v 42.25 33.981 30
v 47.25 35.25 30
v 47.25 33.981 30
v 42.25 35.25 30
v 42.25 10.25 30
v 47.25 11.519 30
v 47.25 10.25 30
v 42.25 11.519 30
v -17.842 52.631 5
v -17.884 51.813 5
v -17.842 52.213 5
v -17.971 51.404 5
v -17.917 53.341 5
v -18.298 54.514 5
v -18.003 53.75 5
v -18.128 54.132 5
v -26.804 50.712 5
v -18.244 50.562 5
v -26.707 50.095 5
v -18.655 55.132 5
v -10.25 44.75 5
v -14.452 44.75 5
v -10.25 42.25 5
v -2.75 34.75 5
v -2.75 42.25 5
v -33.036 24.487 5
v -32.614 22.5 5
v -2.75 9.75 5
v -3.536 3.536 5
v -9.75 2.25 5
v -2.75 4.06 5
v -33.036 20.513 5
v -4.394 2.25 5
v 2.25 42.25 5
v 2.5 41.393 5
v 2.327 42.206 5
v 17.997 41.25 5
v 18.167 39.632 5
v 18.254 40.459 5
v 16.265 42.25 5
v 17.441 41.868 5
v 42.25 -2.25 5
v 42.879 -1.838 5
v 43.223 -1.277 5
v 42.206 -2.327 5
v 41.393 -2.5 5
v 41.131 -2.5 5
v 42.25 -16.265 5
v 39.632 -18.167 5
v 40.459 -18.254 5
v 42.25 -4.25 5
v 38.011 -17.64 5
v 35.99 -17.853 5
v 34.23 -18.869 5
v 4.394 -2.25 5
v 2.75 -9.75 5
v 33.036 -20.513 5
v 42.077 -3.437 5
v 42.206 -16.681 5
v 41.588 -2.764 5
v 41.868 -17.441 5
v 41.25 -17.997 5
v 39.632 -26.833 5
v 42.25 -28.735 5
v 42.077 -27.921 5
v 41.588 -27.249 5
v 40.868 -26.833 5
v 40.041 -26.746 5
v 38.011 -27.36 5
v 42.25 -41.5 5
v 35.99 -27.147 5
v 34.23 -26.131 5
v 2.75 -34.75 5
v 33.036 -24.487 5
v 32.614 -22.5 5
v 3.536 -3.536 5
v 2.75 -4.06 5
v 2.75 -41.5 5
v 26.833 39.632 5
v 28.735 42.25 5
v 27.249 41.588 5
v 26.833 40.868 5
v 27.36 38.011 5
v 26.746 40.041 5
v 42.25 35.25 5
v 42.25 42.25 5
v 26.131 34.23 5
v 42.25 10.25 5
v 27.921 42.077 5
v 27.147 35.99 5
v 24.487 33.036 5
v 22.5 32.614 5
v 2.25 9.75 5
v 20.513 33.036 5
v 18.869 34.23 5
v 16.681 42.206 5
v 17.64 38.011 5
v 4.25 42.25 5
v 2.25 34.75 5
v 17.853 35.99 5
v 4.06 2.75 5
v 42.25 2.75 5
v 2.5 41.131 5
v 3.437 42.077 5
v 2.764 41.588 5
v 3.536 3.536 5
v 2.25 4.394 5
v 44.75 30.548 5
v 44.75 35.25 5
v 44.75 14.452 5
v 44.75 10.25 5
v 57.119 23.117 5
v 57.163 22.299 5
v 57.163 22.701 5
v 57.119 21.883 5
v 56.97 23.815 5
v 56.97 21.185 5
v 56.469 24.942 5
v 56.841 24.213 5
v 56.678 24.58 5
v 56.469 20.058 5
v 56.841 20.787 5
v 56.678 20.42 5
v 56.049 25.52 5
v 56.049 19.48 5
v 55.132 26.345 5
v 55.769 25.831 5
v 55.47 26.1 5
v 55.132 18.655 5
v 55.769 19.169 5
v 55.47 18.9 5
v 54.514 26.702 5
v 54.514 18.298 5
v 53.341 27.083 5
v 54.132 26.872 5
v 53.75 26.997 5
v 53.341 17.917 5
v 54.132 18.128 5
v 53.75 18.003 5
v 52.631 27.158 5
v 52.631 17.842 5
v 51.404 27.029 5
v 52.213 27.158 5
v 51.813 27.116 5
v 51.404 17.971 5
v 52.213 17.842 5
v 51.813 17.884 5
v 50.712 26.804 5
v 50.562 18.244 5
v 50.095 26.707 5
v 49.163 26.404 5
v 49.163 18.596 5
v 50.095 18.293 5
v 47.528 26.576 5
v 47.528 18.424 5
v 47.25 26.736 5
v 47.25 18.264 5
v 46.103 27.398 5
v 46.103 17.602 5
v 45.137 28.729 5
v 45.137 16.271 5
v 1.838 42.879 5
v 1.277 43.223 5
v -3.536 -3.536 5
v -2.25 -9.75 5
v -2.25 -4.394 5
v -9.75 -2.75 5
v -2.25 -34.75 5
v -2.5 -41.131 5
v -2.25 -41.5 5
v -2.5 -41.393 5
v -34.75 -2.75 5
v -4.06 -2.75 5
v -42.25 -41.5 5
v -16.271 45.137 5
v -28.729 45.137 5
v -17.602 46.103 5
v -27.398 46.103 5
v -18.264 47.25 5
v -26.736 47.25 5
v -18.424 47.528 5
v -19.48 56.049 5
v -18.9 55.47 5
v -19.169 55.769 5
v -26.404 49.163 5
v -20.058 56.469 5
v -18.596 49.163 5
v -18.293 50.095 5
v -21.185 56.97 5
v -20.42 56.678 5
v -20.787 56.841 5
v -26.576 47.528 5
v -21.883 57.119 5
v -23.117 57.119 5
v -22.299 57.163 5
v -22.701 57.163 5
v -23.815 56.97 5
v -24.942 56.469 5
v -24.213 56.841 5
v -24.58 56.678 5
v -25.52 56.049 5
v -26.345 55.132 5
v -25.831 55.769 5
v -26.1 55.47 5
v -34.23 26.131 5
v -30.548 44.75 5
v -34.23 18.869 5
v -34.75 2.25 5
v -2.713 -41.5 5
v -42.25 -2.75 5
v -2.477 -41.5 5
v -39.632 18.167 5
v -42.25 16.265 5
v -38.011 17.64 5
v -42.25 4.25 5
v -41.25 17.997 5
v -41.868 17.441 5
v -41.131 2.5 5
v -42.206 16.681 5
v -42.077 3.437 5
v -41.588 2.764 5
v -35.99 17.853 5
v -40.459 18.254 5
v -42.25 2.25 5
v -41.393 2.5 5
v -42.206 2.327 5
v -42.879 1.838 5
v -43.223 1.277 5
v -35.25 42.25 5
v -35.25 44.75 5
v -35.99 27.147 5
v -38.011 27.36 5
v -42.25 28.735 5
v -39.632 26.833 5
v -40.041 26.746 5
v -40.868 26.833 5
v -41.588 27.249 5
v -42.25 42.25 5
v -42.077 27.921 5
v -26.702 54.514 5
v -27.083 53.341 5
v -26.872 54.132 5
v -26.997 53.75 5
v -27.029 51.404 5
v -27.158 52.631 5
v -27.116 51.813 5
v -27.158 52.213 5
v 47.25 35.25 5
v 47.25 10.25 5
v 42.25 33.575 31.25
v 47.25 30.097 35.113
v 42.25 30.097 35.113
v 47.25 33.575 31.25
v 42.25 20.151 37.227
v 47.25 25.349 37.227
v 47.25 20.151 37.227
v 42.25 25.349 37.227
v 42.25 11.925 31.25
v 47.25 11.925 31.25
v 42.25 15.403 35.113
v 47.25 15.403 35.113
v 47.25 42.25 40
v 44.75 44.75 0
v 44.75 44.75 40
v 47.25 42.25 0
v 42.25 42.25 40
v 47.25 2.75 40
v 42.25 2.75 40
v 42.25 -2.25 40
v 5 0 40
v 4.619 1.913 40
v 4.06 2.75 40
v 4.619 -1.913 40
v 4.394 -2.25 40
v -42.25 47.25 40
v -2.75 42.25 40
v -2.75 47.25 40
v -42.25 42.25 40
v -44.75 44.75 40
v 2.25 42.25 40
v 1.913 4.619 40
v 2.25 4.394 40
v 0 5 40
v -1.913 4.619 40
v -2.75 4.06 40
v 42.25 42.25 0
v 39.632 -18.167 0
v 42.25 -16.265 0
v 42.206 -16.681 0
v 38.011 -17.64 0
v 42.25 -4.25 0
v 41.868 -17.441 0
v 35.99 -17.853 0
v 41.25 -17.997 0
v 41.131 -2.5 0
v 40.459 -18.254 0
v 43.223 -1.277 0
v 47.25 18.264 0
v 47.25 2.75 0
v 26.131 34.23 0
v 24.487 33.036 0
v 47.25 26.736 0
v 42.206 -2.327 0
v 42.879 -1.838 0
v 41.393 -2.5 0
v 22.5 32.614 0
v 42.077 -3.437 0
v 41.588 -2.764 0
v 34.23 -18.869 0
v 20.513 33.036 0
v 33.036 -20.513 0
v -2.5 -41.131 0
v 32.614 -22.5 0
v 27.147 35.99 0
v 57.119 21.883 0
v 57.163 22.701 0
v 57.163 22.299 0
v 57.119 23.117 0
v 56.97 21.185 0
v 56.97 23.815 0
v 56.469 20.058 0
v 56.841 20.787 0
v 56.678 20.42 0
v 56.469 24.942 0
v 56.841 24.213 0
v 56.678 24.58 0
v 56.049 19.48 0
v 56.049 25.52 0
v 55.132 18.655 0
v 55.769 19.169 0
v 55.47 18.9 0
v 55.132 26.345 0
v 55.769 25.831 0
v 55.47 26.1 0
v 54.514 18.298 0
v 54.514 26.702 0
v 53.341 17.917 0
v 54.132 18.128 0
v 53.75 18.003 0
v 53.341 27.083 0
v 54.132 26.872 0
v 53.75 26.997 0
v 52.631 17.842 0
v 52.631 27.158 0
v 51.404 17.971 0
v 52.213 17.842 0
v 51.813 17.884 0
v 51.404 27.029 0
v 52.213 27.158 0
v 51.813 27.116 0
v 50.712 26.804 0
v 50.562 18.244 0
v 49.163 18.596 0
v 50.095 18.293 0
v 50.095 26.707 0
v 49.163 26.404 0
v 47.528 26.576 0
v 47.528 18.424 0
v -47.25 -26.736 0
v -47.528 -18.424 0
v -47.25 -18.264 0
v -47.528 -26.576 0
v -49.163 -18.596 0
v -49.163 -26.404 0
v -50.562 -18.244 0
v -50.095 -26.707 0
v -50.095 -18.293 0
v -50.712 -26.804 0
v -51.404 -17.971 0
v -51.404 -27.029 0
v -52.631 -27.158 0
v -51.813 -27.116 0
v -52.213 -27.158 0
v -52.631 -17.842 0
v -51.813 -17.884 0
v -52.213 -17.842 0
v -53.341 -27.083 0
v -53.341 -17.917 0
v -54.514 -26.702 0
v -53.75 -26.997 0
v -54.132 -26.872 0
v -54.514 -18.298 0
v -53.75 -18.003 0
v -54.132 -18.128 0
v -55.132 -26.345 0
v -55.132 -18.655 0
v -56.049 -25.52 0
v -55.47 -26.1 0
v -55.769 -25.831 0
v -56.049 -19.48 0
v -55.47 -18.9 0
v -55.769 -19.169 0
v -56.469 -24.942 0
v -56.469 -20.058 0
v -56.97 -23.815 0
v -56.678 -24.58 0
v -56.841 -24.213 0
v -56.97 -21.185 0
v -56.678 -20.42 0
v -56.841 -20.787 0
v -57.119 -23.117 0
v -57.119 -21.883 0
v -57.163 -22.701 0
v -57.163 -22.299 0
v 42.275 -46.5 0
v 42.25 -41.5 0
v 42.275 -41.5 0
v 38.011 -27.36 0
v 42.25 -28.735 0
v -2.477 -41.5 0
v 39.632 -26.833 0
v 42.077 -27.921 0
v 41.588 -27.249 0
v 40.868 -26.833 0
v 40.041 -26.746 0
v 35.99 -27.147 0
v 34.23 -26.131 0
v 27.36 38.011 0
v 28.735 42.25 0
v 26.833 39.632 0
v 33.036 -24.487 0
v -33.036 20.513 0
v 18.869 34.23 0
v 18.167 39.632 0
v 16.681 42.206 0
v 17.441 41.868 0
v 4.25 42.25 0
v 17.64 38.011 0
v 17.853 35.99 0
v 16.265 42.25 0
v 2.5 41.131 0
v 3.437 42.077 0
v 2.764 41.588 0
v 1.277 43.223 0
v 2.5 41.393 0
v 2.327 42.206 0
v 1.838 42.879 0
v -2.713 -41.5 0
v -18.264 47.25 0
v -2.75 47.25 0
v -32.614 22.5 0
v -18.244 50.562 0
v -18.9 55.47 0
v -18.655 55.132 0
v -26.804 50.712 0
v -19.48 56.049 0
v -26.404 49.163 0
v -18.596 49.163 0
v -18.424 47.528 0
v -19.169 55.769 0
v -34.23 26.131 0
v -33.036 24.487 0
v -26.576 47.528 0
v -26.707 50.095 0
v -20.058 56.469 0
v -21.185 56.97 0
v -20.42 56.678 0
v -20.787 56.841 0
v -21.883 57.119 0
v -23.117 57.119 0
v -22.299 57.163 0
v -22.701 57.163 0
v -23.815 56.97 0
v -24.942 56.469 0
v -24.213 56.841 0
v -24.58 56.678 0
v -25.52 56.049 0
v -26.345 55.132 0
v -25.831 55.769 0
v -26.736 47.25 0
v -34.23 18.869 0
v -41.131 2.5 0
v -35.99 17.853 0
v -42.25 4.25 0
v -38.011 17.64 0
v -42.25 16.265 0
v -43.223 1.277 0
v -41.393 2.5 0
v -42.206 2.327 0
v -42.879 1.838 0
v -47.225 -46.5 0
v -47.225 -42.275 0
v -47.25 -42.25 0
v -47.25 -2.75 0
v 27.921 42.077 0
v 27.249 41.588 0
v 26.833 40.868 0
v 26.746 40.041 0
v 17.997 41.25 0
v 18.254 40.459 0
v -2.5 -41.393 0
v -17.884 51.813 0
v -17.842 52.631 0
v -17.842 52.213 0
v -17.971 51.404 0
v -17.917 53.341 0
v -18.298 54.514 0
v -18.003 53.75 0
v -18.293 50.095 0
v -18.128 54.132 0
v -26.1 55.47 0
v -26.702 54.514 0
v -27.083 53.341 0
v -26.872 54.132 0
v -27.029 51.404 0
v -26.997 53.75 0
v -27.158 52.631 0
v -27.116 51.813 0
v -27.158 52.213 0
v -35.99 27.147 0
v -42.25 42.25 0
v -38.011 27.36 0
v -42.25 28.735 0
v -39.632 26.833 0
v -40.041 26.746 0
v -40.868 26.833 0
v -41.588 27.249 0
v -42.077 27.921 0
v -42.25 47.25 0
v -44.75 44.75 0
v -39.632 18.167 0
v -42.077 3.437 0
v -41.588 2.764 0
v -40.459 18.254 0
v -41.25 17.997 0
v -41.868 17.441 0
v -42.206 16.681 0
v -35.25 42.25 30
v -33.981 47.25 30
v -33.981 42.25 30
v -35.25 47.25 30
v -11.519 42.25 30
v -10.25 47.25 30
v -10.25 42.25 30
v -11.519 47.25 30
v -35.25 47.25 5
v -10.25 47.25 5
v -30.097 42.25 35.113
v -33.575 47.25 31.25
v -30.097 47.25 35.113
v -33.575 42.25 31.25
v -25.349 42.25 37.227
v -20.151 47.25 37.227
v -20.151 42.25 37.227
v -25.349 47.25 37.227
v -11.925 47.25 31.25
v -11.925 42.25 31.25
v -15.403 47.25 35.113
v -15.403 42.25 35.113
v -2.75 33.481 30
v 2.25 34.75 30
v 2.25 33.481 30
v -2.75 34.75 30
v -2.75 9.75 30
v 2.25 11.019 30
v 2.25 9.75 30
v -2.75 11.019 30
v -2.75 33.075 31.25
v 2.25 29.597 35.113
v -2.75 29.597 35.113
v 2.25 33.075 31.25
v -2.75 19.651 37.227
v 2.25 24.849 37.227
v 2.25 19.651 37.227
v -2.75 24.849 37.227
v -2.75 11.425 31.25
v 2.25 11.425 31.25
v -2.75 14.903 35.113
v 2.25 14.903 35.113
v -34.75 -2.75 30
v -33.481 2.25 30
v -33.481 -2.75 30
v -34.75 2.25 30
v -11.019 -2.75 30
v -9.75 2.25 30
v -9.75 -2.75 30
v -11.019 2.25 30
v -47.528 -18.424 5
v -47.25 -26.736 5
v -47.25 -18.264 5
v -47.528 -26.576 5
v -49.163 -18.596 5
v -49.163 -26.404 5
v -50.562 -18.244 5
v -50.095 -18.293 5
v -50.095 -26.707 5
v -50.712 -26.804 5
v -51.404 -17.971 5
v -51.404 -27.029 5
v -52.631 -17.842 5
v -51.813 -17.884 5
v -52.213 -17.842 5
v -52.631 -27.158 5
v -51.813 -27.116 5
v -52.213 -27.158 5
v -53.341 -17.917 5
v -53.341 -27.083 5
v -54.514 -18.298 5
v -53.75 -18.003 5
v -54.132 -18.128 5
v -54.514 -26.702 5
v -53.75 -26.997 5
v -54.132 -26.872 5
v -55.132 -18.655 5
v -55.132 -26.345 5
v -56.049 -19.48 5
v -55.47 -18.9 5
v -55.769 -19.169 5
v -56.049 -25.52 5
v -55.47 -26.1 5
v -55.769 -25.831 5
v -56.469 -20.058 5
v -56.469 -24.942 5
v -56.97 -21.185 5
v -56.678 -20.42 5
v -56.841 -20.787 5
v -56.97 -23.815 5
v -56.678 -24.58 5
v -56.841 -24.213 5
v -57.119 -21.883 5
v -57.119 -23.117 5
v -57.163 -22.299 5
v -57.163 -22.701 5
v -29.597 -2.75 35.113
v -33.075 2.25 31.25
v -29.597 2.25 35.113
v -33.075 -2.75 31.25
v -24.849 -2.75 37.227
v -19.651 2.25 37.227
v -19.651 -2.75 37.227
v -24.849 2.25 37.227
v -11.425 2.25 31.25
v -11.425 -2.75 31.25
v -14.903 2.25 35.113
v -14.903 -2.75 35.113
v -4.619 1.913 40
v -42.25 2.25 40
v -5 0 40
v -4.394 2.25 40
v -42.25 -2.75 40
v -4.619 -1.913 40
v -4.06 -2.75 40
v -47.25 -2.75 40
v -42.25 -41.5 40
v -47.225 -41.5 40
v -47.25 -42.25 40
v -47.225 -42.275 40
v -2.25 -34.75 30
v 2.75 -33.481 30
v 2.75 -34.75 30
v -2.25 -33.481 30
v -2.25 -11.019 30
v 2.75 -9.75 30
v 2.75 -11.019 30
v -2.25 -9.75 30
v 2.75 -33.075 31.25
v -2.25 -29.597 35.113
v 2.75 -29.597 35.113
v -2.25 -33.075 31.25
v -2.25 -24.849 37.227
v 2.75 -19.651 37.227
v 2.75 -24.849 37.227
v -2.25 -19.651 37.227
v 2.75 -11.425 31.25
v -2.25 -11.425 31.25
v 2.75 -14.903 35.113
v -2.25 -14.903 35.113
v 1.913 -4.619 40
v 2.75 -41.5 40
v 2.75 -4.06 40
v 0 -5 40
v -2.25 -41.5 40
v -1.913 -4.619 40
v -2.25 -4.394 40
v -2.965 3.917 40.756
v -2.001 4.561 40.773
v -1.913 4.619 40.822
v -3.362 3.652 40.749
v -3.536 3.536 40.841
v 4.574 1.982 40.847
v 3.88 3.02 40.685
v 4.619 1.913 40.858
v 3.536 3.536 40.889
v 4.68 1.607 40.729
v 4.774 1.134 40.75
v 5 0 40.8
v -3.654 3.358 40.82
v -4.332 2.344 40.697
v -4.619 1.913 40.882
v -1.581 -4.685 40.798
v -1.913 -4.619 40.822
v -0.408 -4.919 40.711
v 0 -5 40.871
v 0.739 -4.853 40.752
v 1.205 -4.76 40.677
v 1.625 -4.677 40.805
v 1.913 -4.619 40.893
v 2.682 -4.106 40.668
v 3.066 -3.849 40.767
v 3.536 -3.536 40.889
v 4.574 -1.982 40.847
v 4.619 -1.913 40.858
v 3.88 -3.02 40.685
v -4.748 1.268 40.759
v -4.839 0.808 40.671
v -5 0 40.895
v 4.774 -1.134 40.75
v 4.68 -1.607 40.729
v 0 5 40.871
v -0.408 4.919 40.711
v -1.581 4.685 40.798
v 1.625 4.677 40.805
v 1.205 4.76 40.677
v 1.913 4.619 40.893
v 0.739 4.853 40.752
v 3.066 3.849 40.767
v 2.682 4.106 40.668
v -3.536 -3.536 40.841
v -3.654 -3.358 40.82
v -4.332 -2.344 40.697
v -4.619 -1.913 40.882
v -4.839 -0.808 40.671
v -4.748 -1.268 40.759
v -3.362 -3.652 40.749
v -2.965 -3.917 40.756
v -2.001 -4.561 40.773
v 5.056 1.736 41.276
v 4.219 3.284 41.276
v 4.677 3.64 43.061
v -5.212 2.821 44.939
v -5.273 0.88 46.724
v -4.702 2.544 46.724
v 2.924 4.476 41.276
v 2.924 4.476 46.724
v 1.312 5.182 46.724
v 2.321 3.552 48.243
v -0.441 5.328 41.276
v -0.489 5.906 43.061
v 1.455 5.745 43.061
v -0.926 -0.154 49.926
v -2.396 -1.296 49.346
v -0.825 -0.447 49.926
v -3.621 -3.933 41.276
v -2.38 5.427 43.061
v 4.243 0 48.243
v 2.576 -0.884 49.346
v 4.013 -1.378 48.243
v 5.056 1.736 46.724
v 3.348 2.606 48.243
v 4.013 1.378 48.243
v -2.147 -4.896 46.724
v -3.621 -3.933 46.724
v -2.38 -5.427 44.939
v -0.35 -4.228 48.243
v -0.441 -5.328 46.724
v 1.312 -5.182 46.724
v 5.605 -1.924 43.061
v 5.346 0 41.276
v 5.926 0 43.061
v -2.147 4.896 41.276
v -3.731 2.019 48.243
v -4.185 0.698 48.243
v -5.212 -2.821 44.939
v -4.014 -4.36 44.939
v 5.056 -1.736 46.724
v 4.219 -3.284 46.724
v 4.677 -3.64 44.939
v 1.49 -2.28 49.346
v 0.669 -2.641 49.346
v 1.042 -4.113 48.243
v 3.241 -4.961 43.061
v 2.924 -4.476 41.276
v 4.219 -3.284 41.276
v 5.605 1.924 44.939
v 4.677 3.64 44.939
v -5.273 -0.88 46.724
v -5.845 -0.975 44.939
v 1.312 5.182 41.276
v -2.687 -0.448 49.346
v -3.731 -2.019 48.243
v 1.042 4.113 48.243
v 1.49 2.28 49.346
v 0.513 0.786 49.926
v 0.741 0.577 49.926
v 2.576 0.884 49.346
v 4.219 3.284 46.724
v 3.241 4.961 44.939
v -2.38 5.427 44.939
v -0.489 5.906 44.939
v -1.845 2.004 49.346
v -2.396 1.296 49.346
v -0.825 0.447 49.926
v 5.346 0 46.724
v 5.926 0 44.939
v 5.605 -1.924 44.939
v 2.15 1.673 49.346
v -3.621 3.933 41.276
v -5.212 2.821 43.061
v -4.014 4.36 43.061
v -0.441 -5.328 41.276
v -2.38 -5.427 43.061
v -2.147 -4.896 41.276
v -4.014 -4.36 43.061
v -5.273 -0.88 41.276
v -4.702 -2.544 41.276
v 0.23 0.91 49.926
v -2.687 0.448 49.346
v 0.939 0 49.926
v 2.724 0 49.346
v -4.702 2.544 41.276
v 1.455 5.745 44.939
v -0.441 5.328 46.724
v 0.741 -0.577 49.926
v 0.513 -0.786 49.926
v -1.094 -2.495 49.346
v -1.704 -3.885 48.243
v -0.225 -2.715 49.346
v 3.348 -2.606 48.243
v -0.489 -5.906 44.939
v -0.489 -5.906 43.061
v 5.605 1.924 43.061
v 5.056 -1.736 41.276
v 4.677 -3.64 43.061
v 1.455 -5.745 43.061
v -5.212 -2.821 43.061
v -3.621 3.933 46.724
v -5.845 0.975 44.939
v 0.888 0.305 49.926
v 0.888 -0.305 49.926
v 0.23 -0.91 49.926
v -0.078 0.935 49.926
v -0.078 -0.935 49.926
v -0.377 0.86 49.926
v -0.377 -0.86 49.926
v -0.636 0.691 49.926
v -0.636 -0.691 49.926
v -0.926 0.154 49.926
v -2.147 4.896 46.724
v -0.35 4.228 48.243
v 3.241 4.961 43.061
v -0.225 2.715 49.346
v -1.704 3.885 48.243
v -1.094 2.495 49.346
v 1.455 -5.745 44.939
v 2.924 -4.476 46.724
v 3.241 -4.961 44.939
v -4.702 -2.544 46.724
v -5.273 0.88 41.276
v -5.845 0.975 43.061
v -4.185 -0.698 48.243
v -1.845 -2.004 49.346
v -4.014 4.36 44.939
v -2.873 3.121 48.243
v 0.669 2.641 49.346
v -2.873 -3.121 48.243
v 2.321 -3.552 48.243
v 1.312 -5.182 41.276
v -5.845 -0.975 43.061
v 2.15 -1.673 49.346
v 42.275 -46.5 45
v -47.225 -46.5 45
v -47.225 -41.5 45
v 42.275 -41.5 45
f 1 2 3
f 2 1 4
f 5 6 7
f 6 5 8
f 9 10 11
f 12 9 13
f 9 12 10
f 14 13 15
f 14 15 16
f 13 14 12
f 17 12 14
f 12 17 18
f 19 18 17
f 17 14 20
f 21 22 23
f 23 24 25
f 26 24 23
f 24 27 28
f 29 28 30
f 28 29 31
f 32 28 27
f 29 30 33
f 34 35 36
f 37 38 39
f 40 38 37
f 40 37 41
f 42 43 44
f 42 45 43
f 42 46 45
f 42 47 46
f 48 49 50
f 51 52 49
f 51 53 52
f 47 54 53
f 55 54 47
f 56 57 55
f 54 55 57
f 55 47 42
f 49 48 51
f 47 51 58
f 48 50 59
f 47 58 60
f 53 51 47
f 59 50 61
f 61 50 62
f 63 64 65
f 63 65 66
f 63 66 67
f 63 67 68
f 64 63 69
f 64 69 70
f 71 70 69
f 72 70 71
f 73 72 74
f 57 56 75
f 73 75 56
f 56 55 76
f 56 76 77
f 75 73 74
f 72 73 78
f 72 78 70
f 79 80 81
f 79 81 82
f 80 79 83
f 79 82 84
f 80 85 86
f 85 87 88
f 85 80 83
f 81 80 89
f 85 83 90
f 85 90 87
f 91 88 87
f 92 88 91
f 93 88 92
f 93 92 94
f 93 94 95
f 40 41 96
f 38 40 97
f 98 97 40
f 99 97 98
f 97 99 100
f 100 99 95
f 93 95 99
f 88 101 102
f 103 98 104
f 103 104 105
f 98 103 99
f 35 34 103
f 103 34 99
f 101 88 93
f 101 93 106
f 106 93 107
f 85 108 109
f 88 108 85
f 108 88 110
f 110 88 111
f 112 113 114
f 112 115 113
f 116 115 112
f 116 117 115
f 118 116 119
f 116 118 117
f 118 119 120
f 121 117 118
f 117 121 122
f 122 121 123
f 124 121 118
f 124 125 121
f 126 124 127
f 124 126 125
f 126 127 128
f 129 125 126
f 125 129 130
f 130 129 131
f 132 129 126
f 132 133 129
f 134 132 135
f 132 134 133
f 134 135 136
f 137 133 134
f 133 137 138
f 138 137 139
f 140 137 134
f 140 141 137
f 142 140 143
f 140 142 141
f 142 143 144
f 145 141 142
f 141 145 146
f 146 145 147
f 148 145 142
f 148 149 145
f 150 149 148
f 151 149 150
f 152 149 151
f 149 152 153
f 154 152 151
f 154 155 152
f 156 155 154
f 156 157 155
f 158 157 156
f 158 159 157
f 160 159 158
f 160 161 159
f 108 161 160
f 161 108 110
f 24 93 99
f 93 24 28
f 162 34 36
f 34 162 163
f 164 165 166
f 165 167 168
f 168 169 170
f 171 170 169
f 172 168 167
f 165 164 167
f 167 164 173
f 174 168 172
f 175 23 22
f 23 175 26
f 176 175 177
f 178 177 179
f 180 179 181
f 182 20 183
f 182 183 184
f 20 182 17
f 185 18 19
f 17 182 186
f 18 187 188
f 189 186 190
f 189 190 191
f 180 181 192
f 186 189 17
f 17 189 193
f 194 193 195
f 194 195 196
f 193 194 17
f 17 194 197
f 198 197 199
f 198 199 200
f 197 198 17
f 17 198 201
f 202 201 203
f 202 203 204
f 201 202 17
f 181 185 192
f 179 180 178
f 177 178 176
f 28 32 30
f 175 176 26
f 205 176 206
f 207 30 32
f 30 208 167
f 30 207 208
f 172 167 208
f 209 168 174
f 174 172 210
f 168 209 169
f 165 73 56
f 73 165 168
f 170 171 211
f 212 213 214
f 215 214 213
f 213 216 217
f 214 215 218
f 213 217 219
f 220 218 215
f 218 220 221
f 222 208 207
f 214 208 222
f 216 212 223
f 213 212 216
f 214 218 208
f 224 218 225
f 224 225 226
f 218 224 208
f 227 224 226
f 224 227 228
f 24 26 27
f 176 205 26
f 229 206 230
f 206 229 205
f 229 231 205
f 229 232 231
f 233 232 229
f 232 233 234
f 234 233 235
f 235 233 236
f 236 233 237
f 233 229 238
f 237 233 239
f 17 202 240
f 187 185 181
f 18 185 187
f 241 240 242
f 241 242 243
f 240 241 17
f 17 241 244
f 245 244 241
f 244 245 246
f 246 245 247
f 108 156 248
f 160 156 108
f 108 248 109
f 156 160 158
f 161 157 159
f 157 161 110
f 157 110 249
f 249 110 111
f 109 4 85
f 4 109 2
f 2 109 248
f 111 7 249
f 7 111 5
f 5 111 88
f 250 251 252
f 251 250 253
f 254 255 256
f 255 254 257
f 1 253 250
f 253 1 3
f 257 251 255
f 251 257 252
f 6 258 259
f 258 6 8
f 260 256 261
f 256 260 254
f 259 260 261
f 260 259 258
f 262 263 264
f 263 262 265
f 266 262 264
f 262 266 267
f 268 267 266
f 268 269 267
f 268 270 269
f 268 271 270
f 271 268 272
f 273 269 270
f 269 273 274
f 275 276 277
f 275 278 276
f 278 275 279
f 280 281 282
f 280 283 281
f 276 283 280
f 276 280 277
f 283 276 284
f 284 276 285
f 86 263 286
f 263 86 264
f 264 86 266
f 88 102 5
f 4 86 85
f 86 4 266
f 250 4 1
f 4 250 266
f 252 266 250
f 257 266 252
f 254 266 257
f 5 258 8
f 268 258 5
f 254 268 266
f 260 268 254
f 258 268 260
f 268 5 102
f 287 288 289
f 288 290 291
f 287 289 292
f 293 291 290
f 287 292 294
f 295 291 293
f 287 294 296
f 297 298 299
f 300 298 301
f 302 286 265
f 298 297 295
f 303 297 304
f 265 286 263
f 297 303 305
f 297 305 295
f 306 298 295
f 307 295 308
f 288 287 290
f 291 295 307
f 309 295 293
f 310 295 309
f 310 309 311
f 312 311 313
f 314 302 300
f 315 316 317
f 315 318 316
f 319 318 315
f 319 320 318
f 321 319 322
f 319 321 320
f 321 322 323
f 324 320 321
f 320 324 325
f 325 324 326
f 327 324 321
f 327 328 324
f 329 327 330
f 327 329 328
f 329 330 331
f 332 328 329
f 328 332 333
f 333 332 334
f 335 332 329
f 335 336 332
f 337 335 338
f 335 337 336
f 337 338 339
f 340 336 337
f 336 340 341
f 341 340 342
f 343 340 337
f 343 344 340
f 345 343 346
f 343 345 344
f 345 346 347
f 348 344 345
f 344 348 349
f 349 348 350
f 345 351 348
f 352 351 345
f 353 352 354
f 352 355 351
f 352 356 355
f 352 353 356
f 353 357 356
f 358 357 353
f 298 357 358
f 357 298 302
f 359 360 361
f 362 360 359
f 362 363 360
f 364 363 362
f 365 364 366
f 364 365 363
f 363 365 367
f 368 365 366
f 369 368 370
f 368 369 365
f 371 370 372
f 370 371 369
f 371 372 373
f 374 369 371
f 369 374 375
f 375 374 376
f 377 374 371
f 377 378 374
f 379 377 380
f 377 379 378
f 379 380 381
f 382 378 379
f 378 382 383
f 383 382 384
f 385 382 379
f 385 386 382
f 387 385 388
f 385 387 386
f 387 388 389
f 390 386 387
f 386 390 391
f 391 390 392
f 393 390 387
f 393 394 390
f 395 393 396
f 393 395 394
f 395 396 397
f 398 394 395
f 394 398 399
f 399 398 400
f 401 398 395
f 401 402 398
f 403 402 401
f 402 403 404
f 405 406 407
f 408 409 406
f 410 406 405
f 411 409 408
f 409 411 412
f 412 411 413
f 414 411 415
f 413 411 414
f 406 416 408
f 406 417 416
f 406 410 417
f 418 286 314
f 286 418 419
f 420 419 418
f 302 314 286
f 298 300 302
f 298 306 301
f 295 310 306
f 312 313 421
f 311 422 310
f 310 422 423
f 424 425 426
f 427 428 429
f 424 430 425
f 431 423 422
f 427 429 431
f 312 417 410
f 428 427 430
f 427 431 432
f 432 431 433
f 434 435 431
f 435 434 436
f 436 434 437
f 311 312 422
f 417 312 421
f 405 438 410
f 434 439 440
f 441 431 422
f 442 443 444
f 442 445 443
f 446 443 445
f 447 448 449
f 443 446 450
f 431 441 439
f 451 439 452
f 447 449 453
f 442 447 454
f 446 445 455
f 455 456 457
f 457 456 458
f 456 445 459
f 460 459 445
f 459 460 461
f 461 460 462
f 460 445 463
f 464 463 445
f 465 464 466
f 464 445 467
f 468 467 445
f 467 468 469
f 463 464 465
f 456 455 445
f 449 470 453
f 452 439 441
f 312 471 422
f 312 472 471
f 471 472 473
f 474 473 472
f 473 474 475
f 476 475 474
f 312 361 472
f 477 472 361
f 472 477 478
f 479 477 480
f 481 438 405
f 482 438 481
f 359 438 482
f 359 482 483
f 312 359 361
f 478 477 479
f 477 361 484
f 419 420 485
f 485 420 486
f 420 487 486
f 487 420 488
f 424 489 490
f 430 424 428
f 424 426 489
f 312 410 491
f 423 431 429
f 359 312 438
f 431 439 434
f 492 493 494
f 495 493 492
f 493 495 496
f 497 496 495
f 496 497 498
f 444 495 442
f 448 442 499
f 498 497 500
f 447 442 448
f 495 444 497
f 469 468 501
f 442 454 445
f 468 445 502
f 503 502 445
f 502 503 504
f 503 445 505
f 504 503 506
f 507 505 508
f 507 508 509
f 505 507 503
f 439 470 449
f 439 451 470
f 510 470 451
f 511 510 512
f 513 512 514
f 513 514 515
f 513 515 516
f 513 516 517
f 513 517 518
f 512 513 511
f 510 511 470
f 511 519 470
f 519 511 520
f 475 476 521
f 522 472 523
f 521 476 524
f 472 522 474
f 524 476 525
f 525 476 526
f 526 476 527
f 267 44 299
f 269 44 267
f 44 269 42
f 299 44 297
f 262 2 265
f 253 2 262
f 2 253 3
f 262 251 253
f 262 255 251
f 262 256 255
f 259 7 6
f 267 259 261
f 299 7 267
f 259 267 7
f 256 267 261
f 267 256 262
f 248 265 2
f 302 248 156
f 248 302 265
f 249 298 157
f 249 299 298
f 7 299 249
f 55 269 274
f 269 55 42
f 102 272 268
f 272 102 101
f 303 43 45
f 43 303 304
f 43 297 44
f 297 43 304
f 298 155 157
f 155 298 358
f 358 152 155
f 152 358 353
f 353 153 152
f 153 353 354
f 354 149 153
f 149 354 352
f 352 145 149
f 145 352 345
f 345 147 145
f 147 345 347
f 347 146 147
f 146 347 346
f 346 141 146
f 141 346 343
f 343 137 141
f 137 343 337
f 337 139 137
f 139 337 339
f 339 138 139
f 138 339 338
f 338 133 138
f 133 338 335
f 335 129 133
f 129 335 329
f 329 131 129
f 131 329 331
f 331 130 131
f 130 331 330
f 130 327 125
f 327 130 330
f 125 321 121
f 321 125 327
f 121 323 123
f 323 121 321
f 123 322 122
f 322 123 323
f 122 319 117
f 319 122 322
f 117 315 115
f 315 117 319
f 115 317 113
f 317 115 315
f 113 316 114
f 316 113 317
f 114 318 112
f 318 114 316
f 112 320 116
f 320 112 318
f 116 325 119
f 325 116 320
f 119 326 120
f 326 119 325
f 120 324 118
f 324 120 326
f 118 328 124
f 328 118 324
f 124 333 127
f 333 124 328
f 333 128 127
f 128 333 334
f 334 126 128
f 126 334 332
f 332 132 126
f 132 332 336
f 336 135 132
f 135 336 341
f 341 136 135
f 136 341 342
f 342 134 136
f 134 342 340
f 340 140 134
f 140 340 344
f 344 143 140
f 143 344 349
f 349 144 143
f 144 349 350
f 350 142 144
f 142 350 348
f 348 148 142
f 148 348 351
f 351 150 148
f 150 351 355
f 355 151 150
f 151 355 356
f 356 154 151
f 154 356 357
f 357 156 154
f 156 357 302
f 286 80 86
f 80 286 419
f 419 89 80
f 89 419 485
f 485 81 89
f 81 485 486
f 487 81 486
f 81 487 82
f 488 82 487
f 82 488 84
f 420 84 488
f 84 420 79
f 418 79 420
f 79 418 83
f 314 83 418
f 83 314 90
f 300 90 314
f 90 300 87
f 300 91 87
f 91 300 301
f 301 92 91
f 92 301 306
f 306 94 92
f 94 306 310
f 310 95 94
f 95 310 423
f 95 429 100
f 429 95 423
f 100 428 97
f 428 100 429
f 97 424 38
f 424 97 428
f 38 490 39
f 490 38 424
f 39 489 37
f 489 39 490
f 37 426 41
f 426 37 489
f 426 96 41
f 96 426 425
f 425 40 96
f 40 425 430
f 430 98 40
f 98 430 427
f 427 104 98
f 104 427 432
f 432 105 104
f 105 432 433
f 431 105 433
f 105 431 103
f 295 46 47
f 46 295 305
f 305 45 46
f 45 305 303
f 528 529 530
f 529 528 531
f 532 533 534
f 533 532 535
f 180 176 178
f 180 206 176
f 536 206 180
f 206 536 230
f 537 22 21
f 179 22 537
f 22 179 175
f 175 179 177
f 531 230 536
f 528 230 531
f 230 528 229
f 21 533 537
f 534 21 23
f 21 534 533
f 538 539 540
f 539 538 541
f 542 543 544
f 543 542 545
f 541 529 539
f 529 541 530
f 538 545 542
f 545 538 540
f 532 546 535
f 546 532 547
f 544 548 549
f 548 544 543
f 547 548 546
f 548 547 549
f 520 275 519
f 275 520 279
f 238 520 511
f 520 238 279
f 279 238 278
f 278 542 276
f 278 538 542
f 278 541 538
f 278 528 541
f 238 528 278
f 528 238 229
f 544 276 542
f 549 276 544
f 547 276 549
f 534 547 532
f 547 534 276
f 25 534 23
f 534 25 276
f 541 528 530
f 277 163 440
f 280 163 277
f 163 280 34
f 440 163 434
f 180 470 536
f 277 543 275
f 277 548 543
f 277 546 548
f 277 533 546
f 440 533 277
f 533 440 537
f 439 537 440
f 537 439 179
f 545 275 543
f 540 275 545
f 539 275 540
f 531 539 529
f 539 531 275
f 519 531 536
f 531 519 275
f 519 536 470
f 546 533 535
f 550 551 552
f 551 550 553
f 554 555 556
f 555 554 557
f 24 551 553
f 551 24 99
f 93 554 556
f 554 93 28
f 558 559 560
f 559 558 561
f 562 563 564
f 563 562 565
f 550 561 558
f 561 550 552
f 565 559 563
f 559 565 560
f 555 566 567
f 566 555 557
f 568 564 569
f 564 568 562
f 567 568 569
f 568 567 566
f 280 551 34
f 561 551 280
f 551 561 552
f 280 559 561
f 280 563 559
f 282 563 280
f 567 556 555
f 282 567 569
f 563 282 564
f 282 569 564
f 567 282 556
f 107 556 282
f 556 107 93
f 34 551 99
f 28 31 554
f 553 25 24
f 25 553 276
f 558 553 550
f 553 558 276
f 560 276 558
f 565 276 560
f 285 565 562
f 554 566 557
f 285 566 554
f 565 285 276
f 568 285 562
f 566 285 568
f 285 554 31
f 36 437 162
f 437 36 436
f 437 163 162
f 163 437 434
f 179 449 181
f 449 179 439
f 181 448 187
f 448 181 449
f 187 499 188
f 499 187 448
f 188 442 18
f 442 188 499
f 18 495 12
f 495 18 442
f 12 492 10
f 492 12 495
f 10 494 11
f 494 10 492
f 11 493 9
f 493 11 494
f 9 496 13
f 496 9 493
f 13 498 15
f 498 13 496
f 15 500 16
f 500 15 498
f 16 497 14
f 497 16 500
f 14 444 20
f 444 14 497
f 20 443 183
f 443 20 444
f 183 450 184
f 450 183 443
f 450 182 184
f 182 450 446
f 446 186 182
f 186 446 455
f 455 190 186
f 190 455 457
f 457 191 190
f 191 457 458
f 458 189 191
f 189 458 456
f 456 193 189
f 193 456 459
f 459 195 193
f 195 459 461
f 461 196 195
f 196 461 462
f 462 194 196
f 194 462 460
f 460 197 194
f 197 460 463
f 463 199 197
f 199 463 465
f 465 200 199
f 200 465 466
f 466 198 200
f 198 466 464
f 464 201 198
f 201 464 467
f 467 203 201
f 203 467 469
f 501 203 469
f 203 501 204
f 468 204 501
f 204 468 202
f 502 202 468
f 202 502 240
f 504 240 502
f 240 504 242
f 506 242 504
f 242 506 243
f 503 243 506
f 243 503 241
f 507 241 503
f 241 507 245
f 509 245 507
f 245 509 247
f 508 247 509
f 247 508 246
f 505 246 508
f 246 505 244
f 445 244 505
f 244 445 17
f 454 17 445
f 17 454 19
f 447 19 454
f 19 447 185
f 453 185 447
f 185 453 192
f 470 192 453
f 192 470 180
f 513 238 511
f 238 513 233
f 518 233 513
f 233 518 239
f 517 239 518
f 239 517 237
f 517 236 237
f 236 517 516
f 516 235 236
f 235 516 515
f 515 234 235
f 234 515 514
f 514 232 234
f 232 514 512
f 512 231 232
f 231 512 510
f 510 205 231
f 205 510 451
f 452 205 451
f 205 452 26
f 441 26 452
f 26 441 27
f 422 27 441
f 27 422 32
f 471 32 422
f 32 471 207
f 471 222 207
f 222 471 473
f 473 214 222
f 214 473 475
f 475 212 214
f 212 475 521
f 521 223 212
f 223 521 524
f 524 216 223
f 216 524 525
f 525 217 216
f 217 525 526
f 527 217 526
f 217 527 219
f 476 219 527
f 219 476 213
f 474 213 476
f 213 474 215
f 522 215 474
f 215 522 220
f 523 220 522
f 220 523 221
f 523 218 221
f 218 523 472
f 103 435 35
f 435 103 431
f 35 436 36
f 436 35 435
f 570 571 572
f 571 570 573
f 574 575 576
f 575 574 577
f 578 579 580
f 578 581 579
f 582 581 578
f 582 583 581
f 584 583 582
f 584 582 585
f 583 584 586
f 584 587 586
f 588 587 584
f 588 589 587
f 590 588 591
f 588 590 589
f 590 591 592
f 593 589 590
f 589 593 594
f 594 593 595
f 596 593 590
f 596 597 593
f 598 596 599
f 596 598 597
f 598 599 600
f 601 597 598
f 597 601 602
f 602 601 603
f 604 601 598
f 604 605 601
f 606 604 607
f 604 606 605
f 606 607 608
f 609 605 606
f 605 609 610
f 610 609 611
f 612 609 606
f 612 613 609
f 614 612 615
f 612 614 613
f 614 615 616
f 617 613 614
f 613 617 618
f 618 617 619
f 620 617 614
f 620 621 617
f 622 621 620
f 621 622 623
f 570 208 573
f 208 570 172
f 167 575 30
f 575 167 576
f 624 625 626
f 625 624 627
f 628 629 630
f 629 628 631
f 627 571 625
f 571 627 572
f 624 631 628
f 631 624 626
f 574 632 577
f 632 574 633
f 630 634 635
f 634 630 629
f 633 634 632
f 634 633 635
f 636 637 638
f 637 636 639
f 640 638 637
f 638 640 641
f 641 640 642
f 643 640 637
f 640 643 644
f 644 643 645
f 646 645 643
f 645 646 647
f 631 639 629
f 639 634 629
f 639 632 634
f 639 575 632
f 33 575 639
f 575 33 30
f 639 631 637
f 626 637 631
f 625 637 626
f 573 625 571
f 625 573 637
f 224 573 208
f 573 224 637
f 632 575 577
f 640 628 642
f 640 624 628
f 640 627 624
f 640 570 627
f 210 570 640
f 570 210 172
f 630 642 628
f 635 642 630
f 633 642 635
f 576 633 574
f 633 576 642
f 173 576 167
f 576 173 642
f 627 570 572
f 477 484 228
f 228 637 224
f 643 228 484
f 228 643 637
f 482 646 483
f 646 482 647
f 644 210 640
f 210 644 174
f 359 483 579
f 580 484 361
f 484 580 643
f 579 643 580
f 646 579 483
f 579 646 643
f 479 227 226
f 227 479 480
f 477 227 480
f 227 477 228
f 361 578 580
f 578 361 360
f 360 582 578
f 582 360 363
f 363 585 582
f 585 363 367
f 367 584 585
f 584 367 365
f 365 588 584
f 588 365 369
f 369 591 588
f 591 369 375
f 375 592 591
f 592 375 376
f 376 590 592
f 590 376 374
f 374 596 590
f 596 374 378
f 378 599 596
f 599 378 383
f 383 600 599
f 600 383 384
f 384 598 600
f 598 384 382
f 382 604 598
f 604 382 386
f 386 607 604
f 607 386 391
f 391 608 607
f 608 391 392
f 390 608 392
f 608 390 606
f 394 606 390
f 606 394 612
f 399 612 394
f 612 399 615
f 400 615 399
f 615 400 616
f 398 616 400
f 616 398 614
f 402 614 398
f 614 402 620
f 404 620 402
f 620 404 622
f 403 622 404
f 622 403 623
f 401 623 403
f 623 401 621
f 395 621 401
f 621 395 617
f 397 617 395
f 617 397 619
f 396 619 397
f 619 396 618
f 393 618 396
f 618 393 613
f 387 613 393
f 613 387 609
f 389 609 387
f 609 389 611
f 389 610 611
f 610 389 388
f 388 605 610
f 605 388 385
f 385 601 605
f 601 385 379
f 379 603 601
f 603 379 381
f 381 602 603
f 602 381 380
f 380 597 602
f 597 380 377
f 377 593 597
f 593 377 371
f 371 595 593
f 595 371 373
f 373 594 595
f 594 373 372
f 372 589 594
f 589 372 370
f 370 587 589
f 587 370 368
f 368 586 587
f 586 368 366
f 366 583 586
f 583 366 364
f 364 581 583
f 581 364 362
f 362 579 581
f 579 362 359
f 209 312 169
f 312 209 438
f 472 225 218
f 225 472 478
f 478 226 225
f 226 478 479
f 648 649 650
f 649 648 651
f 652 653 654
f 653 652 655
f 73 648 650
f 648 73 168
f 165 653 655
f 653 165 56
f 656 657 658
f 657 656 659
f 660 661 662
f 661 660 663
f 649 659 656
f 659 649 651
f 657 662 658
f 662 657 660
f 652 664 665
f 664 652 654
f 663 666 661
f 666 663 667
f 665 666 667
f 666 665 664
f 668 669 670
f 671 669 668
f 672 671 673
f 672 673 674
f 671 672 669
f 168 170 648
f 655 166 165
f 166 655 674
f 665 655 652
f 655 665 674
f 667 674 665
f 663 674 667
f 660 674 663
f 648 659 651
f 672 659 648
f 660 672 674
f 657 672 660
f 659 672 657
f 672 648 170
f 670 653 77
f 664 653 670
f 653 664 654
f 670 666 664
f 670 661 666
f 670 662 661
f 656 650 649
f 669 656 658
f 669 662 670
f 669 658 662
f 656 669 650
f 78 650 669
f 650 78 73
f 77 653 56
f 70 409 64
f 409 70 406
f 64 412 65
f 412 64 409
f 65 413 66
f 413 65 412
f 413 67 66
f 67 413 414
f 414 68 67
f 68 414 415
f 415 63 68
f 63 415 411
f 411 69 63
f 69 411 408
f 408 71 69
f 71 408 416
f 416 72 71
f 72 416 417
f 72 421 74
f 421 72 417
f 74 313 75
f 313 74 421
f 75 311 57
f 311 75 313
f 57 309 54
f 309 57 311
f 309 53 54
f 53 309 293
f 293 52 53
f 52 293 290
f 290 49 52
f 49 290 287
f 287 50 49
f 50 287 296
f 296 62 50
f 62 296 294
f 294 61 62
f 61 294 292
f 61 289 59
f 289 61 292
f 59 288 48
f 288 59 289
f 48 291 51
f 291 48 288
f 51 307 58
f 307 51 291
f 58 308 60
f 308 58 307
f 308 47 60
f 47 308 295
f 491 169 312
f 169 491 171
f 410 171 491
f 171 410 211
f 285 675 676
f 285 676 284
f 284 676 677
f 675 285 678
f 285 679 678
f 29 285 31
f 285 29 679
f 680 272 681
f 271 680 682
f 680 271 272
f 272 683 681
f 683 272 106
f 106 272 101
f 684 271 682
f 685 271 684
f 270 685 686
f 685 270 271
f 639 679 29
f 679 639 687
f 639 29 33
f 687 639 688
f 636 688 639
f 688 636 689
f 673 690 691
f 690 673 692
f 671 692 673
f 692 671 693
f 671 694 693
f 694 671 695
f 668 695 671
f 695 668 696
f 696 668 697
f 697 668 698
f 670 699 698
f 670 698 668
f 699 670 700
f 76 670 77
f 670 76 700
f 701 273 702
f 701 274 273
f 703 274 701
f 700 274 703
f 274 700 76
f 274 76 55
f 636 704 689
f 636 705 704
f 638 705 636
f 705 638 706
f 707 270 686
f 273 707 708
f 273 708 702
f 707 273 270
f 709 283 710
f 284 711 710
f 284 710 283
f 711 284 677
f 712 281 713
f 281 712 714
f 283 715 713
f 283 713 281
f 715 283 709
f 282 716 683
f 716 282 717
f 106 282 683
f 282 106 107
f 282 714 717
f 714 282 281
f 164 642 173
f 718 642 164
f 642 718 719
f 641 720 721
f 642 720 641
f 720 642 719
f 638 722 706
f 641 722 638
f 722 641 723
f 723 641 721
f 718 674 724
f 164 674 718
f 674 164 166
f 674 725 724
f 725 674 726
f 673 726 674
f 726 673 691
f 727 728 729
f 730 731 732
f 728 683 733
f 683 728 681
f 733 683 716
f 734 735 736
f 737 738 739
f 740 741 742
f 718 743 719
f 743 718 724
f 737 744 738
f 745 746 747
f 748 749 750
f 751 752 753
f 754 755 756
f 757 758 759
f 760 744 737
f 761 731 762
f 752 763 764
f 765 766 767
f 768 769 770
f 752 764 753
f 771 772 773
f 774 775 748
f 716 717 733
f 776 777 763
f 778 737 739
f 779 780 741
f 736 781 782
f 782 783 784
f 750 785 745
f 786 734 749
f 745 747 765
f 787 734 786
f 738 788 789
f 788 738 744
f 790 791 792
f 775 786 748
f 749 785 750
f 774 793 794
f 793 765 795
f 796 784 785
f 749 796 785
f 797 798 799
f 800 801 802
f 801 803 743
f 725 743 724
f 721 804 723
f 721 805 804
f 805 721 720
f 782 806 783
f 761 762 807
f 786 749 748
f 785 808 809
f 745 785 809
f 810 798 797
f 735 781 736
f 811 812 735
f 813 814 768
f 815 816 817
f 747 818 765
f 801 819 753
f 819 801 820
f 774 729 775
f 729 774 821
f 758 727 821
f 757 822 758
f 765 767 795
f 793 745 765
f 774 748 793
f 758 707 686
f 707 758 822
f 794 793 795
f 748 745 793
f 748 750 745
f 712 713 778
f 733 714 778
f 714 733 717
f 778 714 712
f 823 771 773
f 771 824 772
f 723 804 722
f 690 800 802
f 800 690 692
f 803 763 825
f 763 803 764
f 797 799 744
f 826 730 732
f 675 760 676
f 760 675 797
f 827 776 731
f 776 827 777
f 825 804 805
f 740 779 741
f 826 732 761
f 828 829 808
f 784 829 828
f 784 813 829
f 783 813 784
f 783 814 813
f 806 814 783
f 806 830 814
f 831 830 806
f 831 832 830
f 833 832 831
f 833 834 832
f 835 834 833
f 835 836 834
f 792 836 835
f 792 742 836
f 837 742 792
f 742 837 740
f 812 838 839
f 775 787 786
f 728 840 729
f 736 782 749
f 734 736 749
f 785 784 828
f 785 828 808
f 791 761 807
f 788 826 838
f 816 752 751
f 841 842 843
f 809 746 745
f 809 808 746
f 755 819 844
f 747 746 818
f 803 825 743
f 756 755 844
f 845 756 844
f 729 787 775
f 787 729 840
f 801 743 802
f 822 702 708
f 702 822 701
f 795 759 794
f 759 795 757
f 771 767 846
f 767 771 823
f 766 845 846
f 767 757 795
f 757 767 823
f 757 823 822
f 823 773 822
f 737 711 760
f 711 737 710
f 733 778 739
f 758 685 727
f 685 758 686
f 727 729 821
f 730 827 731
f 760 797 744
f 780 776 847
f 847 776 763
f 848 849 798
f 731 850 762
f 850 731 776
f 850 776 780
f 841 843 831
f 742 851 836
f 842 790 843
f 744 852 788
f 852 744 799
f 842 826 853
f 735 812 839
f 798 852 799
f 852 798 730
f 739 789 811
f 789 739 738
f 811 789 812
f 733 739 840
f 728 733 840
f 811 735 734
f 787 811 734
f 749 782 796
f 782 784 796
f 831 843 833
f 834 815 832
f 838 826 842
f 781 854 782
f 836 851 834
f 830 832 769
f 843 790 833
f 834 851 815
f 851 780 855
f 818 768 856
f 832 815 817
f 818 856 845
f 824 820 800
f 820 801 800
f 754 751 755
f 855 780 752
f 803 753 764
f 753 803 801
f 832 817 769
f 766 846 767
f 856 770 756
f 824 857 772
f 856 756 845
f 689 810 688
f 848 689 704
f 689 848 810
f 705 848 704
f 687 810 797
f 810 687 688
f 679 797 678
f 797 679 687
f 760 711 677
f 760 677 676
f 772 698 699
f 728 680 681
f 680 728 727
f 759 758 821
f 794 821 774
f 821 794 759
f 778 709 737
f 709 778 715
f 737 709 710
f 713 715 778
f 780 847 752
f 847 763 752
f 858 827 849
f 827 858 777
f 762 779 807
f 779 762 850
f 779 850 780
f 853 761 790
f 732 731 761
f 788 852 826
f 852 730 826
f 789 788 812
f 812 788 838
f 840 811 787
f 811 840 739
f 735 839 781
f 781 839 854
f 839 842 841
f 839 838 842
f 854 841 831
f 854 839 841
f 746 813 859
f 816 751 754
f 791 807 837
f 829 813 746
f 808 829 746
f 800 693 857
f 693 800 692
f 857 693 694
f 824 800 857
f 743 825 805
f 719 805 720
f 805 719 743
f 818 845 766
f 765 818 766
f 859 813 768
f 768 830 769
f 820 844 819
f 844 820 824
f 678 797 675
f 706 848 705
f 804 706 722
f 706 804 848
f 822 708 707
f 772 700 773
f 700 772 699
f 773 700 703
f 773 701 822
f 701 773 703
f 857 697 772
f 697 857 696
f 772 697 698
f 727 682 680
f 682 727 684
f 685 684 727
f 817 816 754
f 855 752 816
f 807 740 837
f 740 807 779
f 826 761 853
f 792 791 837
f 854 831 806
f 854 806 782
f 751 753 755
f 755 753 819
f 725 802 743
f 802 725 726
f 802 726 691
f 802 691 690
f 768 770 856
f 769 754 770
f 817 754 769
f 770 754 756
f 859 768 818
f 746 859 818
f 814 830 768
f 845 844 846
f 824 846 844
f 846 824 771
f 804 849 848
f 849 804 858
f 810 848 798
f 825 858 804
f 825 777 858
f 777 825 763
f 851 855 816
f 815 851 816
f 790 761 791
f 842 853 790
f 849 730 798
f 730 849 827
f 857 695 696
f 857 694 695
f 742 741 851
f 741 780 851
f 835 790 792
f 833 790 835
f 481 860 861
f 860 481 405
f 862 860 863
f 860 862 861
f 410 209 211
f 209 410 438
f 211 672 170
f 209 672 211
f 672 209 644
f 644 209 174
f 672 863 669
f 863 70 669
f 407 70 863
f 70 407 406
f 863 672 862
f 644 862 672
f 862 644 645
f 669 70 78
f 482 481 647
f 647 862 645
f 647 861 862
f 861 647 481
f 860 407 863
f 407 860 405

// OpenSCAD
//Perimeter
W=[true,false,false,false];
//External Gates
G=[true,true,false,true];
//Internal Gates
I=[false,true,true,true];

/*[Hidden]*/


 
color("Red") piece(W,G,I);
 


module piece(W,G,I){
rotate([0,0,0]) quart(G[0],I[0],W[1],W[2]);
rotate([0,0,90]) quart(G[1 ],I[1],W[2],W[3]);
rotate([0,0,180]) quart(G[2],I[2],W[3],W[0]);
rotate([0,0,270]) quart(G[3],I[3],W[0],W[1]);
cylinder(45,5,5);
translate([0,0,44])sphere(6,center=true);
if(W[0]==true){
rotate([0,0,-90])
translate([41.5,-47.225,0])cube([5,89.5,45]);
}
if(W[1]==true){
rotate([0,0,0])
translate([41.5,-47.225 ,0])cube([5,89.5,45]);
}
if(W[2]==true){
rotate([0,0,90])
translate([41.5,-47.225,0])cube([5,89.5,45]);
}
if(W[3]==true){
rotate([0,0,180])
translate([41.5,-47.225,0])cube([5,89.5,45]);
}
if(W[0]==true&&W[1]==true){
rotate([0,0,0])
{
translate([40,-40,0])translate([4,-4,0]){cylinder(51,5,5);
translate([0,0,51])sphere(7,center=true);}
}}
if(W[1]==true&&W[2]==true){
rotate([0,0,90])
{
translate([40,-40,0])translate([4,-4,0]){cylinder(51,5,5);
translate([0,0,51])sphere(7,center=true);}
}}
if(W[2]==true&&W[3]==true){
rotate([0,0,180])
{
translate([40,-40,0])translate([4,-4,0]){cylinder(51,5,5);
translate([0,0,51])sphere(7,center=true);}
}}
if(W[3]==true&&W[0]==true){
rotate([0,0,270])
{
translate([40,-40,0])translate([4,-4,0]){cylinder(51,5,5);
translate([0,0,51])sphere(7,center=true);}
}}

}


module quart(g,i,w,w2){
$fn=15;
translate([22.5,22.5]){
linear_extrude(5, convexity = 5){
offset(r=2)offset(r=-6)offset(r=4){ difference(){
translate([1,-1.25,-0])square([42.5,42],center=true);
if(w2==false){rotate([0,0,90])translate([15,0,0]) circle(5);}

}translate([-1,-22.5,-0])square([42.5,5],center=true);

if(w==false){hull(){
translate([30,0,0]) circle(4.75);
*translate([20,0,0]) circle(1);}}
}}
translate([-0.25,0.25,0]){

if(w==false){
if(g==false){
linear_extrude(40, convexity = 5){
polygon([[20,-20],[20,19.5],[22.5,22],[25,19.5],[25,-20],[22.5,-22.5]]); }
}
else {difference(){

linear_extrude(40, convexity = 5){
polygon([[20,-20],[20,19.5],[22.5,22],[25,19.5],[25,-20],[22.5,-22.5]]); }
union() {
translate([10,-12.5,5])cube([25,25,25]);
translate([25,0,25])rotate([0,90,0])cylinder(30,12.5,12.5,center=true);
}
}}}


if(i==false){
linear_extrude(40, convexity = 5)rotate([0,0,-90])
polygon([[20,-20],[20,20],[22.5,22.5],[25,20],[25,-20],[22.5,-22.5]]);}
else {difference(){

linear_extrude(40, convexity = 5){
rotate([0,0,-90])polygon([[20,-20],[20,20],[22.5,22.5],[25,20],[25,-20],[22.5,-22.5]]); }
rotate([0,0,-90])union(){
translate([10,-12.5,5])cube([25,25,25]);
translate([25,0,25])rotate([0,90,0])cylinder(30,12.5,12.5,center=true);}
}}
}}}
function rnd(a = 0, b = 1) = (rands(min(a, b), max(a, b), 1)[0]);
function dice()=round (rnd(2.2))==1?false:true;
function rndc() = [rands(0, 1, 1)[0], rands(0, 1, 1)[0], rands(0, 1, 1)[0]];
